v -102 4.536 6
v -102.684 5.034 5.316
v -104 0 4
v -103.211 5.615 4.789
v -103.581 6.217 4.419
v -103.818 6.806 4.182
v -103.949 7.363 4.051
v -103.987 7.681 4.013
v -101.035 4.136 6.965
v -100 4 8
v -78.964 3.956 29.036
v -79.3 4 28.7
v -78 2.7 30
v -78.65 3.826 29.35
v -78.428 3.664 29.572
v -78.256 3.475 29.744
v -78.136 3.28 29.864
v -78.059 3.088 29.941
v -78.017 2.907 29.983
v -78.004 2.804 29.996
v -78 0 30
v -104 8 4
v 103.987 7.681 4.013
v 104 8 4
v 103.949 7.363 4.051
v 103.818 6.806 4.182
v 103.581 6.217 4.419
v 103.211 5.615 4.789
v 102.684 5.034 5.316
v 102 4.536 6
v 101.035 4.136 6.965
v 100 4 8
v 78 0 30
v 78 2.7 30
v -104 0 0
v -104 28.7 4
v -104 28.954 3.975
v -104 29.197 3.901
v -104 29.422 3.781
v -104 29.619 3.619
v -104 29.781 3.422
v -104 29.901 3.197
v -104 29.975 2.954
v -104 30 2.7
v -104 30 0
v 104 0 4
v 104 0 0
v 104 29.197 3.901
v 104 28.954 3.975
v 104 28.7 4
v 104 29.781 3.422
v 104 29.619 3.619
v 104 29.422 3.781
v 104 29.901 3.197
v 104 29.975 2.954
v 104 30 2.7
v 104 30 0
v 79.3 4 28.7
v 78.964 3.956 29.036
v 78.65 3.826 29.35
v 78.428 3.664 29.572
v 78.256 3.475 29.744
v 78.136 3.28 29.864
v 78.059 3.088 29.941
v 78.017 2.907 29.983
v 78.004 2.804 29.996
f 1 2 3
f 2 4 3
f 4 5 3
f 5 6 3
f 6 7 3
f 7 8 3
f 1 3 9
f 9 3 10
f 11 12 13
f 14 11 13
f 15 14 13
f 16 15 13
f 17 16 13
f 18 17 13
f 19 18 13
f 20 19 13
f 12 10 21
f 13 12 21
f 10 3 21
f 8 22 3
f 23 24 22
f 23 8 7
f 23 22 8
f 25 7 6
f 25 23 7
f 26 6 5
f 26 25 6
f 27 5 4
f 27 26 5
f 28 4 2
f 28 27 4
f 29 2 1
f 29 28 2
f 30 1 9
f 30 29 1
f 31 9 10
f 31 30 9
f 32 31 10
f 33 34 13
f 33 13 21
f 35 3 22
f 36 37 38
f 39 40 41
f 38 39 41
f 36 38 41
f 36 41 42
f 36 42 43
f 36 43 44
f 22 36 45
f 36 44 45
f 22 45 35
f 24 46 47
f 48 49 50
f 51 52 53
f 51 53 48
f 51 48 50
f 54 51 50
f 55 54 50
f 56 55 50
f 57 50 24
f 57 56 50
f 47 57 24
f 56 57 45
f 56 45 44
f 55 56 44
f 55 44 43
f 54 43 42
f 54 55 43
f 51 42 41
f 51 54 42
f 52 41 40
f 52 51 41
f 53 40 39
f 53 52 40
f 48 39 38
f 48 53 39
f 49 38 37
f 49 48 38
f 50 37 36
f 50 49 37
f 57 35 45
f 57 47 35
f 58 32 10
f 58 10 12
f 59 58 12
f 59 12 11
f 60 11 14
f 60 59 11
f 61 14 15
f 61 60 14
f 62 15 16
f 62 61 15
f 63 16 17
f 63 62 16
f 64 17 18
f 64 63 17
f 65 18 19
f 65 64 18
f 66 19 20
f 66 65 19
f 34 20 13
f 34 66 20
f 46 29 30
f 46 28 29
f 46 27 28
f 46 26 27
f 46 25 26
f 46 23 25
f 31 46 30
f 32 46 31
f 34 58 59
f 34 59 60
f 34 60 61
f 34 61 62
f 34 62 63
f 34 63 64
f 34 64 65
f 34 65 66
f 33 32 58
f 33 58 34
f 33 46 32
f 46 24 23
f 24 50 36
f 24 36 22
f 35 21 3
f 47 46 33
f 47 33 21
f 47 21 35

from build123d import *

# Parameters (mm, degrees)
EXTRUDE_1_DEPTH     = 104
CUT_EXTRUDE_1_DEPTH = 113.320968657


with BuildPart() as part:
    # Эскиз1 → Бобышка-Вытянуть1 (new, symmetric)
    with BuildSketch(Plane(origin=(0, 0, 0), x_dir=(0, 0, -1), z_dir=(1, 0, 0))):
        with BuildLine():
            Line((0, 0), (0, 30))
            Line((0, 30), (-2.7, 30))
            ThreePointArc((-2.7, 30), (-3.619238816, 29.619238816), (-4, 28.7))
            Line((-4, 28.7), (-4, 8))
            ThreePointArc((-4, 8), (-5.171572875, 5.171572875), (-8, 4))
            Line((-8, 4), (-28.7, 4))
            ThreePointArc((-28.7, 4), (-29.619238816, 3.619238816), (-30, 2.7))
            Line((-30, 2.7), (-30, 0))
            Line((-30, 0), (0, 0))
        make_face()
    extrude(amount=EXTRUDE_1_DEPTH, both=True)

    # Эскиз2 → Вырез-Вытянуть1 (cut, through all)
    with BuildSketch(Plane.XZ):
        Polygon((-104, 4), (-78, 30), (-104, 30), align=None)
        Polygon((104, 4), (78, 30), (104, 30), align=None)
    extrude(amount=-CUT_EXTRUDE_1_DEPTH, mode=Mode.SUBTRACT)


solid = part.part
